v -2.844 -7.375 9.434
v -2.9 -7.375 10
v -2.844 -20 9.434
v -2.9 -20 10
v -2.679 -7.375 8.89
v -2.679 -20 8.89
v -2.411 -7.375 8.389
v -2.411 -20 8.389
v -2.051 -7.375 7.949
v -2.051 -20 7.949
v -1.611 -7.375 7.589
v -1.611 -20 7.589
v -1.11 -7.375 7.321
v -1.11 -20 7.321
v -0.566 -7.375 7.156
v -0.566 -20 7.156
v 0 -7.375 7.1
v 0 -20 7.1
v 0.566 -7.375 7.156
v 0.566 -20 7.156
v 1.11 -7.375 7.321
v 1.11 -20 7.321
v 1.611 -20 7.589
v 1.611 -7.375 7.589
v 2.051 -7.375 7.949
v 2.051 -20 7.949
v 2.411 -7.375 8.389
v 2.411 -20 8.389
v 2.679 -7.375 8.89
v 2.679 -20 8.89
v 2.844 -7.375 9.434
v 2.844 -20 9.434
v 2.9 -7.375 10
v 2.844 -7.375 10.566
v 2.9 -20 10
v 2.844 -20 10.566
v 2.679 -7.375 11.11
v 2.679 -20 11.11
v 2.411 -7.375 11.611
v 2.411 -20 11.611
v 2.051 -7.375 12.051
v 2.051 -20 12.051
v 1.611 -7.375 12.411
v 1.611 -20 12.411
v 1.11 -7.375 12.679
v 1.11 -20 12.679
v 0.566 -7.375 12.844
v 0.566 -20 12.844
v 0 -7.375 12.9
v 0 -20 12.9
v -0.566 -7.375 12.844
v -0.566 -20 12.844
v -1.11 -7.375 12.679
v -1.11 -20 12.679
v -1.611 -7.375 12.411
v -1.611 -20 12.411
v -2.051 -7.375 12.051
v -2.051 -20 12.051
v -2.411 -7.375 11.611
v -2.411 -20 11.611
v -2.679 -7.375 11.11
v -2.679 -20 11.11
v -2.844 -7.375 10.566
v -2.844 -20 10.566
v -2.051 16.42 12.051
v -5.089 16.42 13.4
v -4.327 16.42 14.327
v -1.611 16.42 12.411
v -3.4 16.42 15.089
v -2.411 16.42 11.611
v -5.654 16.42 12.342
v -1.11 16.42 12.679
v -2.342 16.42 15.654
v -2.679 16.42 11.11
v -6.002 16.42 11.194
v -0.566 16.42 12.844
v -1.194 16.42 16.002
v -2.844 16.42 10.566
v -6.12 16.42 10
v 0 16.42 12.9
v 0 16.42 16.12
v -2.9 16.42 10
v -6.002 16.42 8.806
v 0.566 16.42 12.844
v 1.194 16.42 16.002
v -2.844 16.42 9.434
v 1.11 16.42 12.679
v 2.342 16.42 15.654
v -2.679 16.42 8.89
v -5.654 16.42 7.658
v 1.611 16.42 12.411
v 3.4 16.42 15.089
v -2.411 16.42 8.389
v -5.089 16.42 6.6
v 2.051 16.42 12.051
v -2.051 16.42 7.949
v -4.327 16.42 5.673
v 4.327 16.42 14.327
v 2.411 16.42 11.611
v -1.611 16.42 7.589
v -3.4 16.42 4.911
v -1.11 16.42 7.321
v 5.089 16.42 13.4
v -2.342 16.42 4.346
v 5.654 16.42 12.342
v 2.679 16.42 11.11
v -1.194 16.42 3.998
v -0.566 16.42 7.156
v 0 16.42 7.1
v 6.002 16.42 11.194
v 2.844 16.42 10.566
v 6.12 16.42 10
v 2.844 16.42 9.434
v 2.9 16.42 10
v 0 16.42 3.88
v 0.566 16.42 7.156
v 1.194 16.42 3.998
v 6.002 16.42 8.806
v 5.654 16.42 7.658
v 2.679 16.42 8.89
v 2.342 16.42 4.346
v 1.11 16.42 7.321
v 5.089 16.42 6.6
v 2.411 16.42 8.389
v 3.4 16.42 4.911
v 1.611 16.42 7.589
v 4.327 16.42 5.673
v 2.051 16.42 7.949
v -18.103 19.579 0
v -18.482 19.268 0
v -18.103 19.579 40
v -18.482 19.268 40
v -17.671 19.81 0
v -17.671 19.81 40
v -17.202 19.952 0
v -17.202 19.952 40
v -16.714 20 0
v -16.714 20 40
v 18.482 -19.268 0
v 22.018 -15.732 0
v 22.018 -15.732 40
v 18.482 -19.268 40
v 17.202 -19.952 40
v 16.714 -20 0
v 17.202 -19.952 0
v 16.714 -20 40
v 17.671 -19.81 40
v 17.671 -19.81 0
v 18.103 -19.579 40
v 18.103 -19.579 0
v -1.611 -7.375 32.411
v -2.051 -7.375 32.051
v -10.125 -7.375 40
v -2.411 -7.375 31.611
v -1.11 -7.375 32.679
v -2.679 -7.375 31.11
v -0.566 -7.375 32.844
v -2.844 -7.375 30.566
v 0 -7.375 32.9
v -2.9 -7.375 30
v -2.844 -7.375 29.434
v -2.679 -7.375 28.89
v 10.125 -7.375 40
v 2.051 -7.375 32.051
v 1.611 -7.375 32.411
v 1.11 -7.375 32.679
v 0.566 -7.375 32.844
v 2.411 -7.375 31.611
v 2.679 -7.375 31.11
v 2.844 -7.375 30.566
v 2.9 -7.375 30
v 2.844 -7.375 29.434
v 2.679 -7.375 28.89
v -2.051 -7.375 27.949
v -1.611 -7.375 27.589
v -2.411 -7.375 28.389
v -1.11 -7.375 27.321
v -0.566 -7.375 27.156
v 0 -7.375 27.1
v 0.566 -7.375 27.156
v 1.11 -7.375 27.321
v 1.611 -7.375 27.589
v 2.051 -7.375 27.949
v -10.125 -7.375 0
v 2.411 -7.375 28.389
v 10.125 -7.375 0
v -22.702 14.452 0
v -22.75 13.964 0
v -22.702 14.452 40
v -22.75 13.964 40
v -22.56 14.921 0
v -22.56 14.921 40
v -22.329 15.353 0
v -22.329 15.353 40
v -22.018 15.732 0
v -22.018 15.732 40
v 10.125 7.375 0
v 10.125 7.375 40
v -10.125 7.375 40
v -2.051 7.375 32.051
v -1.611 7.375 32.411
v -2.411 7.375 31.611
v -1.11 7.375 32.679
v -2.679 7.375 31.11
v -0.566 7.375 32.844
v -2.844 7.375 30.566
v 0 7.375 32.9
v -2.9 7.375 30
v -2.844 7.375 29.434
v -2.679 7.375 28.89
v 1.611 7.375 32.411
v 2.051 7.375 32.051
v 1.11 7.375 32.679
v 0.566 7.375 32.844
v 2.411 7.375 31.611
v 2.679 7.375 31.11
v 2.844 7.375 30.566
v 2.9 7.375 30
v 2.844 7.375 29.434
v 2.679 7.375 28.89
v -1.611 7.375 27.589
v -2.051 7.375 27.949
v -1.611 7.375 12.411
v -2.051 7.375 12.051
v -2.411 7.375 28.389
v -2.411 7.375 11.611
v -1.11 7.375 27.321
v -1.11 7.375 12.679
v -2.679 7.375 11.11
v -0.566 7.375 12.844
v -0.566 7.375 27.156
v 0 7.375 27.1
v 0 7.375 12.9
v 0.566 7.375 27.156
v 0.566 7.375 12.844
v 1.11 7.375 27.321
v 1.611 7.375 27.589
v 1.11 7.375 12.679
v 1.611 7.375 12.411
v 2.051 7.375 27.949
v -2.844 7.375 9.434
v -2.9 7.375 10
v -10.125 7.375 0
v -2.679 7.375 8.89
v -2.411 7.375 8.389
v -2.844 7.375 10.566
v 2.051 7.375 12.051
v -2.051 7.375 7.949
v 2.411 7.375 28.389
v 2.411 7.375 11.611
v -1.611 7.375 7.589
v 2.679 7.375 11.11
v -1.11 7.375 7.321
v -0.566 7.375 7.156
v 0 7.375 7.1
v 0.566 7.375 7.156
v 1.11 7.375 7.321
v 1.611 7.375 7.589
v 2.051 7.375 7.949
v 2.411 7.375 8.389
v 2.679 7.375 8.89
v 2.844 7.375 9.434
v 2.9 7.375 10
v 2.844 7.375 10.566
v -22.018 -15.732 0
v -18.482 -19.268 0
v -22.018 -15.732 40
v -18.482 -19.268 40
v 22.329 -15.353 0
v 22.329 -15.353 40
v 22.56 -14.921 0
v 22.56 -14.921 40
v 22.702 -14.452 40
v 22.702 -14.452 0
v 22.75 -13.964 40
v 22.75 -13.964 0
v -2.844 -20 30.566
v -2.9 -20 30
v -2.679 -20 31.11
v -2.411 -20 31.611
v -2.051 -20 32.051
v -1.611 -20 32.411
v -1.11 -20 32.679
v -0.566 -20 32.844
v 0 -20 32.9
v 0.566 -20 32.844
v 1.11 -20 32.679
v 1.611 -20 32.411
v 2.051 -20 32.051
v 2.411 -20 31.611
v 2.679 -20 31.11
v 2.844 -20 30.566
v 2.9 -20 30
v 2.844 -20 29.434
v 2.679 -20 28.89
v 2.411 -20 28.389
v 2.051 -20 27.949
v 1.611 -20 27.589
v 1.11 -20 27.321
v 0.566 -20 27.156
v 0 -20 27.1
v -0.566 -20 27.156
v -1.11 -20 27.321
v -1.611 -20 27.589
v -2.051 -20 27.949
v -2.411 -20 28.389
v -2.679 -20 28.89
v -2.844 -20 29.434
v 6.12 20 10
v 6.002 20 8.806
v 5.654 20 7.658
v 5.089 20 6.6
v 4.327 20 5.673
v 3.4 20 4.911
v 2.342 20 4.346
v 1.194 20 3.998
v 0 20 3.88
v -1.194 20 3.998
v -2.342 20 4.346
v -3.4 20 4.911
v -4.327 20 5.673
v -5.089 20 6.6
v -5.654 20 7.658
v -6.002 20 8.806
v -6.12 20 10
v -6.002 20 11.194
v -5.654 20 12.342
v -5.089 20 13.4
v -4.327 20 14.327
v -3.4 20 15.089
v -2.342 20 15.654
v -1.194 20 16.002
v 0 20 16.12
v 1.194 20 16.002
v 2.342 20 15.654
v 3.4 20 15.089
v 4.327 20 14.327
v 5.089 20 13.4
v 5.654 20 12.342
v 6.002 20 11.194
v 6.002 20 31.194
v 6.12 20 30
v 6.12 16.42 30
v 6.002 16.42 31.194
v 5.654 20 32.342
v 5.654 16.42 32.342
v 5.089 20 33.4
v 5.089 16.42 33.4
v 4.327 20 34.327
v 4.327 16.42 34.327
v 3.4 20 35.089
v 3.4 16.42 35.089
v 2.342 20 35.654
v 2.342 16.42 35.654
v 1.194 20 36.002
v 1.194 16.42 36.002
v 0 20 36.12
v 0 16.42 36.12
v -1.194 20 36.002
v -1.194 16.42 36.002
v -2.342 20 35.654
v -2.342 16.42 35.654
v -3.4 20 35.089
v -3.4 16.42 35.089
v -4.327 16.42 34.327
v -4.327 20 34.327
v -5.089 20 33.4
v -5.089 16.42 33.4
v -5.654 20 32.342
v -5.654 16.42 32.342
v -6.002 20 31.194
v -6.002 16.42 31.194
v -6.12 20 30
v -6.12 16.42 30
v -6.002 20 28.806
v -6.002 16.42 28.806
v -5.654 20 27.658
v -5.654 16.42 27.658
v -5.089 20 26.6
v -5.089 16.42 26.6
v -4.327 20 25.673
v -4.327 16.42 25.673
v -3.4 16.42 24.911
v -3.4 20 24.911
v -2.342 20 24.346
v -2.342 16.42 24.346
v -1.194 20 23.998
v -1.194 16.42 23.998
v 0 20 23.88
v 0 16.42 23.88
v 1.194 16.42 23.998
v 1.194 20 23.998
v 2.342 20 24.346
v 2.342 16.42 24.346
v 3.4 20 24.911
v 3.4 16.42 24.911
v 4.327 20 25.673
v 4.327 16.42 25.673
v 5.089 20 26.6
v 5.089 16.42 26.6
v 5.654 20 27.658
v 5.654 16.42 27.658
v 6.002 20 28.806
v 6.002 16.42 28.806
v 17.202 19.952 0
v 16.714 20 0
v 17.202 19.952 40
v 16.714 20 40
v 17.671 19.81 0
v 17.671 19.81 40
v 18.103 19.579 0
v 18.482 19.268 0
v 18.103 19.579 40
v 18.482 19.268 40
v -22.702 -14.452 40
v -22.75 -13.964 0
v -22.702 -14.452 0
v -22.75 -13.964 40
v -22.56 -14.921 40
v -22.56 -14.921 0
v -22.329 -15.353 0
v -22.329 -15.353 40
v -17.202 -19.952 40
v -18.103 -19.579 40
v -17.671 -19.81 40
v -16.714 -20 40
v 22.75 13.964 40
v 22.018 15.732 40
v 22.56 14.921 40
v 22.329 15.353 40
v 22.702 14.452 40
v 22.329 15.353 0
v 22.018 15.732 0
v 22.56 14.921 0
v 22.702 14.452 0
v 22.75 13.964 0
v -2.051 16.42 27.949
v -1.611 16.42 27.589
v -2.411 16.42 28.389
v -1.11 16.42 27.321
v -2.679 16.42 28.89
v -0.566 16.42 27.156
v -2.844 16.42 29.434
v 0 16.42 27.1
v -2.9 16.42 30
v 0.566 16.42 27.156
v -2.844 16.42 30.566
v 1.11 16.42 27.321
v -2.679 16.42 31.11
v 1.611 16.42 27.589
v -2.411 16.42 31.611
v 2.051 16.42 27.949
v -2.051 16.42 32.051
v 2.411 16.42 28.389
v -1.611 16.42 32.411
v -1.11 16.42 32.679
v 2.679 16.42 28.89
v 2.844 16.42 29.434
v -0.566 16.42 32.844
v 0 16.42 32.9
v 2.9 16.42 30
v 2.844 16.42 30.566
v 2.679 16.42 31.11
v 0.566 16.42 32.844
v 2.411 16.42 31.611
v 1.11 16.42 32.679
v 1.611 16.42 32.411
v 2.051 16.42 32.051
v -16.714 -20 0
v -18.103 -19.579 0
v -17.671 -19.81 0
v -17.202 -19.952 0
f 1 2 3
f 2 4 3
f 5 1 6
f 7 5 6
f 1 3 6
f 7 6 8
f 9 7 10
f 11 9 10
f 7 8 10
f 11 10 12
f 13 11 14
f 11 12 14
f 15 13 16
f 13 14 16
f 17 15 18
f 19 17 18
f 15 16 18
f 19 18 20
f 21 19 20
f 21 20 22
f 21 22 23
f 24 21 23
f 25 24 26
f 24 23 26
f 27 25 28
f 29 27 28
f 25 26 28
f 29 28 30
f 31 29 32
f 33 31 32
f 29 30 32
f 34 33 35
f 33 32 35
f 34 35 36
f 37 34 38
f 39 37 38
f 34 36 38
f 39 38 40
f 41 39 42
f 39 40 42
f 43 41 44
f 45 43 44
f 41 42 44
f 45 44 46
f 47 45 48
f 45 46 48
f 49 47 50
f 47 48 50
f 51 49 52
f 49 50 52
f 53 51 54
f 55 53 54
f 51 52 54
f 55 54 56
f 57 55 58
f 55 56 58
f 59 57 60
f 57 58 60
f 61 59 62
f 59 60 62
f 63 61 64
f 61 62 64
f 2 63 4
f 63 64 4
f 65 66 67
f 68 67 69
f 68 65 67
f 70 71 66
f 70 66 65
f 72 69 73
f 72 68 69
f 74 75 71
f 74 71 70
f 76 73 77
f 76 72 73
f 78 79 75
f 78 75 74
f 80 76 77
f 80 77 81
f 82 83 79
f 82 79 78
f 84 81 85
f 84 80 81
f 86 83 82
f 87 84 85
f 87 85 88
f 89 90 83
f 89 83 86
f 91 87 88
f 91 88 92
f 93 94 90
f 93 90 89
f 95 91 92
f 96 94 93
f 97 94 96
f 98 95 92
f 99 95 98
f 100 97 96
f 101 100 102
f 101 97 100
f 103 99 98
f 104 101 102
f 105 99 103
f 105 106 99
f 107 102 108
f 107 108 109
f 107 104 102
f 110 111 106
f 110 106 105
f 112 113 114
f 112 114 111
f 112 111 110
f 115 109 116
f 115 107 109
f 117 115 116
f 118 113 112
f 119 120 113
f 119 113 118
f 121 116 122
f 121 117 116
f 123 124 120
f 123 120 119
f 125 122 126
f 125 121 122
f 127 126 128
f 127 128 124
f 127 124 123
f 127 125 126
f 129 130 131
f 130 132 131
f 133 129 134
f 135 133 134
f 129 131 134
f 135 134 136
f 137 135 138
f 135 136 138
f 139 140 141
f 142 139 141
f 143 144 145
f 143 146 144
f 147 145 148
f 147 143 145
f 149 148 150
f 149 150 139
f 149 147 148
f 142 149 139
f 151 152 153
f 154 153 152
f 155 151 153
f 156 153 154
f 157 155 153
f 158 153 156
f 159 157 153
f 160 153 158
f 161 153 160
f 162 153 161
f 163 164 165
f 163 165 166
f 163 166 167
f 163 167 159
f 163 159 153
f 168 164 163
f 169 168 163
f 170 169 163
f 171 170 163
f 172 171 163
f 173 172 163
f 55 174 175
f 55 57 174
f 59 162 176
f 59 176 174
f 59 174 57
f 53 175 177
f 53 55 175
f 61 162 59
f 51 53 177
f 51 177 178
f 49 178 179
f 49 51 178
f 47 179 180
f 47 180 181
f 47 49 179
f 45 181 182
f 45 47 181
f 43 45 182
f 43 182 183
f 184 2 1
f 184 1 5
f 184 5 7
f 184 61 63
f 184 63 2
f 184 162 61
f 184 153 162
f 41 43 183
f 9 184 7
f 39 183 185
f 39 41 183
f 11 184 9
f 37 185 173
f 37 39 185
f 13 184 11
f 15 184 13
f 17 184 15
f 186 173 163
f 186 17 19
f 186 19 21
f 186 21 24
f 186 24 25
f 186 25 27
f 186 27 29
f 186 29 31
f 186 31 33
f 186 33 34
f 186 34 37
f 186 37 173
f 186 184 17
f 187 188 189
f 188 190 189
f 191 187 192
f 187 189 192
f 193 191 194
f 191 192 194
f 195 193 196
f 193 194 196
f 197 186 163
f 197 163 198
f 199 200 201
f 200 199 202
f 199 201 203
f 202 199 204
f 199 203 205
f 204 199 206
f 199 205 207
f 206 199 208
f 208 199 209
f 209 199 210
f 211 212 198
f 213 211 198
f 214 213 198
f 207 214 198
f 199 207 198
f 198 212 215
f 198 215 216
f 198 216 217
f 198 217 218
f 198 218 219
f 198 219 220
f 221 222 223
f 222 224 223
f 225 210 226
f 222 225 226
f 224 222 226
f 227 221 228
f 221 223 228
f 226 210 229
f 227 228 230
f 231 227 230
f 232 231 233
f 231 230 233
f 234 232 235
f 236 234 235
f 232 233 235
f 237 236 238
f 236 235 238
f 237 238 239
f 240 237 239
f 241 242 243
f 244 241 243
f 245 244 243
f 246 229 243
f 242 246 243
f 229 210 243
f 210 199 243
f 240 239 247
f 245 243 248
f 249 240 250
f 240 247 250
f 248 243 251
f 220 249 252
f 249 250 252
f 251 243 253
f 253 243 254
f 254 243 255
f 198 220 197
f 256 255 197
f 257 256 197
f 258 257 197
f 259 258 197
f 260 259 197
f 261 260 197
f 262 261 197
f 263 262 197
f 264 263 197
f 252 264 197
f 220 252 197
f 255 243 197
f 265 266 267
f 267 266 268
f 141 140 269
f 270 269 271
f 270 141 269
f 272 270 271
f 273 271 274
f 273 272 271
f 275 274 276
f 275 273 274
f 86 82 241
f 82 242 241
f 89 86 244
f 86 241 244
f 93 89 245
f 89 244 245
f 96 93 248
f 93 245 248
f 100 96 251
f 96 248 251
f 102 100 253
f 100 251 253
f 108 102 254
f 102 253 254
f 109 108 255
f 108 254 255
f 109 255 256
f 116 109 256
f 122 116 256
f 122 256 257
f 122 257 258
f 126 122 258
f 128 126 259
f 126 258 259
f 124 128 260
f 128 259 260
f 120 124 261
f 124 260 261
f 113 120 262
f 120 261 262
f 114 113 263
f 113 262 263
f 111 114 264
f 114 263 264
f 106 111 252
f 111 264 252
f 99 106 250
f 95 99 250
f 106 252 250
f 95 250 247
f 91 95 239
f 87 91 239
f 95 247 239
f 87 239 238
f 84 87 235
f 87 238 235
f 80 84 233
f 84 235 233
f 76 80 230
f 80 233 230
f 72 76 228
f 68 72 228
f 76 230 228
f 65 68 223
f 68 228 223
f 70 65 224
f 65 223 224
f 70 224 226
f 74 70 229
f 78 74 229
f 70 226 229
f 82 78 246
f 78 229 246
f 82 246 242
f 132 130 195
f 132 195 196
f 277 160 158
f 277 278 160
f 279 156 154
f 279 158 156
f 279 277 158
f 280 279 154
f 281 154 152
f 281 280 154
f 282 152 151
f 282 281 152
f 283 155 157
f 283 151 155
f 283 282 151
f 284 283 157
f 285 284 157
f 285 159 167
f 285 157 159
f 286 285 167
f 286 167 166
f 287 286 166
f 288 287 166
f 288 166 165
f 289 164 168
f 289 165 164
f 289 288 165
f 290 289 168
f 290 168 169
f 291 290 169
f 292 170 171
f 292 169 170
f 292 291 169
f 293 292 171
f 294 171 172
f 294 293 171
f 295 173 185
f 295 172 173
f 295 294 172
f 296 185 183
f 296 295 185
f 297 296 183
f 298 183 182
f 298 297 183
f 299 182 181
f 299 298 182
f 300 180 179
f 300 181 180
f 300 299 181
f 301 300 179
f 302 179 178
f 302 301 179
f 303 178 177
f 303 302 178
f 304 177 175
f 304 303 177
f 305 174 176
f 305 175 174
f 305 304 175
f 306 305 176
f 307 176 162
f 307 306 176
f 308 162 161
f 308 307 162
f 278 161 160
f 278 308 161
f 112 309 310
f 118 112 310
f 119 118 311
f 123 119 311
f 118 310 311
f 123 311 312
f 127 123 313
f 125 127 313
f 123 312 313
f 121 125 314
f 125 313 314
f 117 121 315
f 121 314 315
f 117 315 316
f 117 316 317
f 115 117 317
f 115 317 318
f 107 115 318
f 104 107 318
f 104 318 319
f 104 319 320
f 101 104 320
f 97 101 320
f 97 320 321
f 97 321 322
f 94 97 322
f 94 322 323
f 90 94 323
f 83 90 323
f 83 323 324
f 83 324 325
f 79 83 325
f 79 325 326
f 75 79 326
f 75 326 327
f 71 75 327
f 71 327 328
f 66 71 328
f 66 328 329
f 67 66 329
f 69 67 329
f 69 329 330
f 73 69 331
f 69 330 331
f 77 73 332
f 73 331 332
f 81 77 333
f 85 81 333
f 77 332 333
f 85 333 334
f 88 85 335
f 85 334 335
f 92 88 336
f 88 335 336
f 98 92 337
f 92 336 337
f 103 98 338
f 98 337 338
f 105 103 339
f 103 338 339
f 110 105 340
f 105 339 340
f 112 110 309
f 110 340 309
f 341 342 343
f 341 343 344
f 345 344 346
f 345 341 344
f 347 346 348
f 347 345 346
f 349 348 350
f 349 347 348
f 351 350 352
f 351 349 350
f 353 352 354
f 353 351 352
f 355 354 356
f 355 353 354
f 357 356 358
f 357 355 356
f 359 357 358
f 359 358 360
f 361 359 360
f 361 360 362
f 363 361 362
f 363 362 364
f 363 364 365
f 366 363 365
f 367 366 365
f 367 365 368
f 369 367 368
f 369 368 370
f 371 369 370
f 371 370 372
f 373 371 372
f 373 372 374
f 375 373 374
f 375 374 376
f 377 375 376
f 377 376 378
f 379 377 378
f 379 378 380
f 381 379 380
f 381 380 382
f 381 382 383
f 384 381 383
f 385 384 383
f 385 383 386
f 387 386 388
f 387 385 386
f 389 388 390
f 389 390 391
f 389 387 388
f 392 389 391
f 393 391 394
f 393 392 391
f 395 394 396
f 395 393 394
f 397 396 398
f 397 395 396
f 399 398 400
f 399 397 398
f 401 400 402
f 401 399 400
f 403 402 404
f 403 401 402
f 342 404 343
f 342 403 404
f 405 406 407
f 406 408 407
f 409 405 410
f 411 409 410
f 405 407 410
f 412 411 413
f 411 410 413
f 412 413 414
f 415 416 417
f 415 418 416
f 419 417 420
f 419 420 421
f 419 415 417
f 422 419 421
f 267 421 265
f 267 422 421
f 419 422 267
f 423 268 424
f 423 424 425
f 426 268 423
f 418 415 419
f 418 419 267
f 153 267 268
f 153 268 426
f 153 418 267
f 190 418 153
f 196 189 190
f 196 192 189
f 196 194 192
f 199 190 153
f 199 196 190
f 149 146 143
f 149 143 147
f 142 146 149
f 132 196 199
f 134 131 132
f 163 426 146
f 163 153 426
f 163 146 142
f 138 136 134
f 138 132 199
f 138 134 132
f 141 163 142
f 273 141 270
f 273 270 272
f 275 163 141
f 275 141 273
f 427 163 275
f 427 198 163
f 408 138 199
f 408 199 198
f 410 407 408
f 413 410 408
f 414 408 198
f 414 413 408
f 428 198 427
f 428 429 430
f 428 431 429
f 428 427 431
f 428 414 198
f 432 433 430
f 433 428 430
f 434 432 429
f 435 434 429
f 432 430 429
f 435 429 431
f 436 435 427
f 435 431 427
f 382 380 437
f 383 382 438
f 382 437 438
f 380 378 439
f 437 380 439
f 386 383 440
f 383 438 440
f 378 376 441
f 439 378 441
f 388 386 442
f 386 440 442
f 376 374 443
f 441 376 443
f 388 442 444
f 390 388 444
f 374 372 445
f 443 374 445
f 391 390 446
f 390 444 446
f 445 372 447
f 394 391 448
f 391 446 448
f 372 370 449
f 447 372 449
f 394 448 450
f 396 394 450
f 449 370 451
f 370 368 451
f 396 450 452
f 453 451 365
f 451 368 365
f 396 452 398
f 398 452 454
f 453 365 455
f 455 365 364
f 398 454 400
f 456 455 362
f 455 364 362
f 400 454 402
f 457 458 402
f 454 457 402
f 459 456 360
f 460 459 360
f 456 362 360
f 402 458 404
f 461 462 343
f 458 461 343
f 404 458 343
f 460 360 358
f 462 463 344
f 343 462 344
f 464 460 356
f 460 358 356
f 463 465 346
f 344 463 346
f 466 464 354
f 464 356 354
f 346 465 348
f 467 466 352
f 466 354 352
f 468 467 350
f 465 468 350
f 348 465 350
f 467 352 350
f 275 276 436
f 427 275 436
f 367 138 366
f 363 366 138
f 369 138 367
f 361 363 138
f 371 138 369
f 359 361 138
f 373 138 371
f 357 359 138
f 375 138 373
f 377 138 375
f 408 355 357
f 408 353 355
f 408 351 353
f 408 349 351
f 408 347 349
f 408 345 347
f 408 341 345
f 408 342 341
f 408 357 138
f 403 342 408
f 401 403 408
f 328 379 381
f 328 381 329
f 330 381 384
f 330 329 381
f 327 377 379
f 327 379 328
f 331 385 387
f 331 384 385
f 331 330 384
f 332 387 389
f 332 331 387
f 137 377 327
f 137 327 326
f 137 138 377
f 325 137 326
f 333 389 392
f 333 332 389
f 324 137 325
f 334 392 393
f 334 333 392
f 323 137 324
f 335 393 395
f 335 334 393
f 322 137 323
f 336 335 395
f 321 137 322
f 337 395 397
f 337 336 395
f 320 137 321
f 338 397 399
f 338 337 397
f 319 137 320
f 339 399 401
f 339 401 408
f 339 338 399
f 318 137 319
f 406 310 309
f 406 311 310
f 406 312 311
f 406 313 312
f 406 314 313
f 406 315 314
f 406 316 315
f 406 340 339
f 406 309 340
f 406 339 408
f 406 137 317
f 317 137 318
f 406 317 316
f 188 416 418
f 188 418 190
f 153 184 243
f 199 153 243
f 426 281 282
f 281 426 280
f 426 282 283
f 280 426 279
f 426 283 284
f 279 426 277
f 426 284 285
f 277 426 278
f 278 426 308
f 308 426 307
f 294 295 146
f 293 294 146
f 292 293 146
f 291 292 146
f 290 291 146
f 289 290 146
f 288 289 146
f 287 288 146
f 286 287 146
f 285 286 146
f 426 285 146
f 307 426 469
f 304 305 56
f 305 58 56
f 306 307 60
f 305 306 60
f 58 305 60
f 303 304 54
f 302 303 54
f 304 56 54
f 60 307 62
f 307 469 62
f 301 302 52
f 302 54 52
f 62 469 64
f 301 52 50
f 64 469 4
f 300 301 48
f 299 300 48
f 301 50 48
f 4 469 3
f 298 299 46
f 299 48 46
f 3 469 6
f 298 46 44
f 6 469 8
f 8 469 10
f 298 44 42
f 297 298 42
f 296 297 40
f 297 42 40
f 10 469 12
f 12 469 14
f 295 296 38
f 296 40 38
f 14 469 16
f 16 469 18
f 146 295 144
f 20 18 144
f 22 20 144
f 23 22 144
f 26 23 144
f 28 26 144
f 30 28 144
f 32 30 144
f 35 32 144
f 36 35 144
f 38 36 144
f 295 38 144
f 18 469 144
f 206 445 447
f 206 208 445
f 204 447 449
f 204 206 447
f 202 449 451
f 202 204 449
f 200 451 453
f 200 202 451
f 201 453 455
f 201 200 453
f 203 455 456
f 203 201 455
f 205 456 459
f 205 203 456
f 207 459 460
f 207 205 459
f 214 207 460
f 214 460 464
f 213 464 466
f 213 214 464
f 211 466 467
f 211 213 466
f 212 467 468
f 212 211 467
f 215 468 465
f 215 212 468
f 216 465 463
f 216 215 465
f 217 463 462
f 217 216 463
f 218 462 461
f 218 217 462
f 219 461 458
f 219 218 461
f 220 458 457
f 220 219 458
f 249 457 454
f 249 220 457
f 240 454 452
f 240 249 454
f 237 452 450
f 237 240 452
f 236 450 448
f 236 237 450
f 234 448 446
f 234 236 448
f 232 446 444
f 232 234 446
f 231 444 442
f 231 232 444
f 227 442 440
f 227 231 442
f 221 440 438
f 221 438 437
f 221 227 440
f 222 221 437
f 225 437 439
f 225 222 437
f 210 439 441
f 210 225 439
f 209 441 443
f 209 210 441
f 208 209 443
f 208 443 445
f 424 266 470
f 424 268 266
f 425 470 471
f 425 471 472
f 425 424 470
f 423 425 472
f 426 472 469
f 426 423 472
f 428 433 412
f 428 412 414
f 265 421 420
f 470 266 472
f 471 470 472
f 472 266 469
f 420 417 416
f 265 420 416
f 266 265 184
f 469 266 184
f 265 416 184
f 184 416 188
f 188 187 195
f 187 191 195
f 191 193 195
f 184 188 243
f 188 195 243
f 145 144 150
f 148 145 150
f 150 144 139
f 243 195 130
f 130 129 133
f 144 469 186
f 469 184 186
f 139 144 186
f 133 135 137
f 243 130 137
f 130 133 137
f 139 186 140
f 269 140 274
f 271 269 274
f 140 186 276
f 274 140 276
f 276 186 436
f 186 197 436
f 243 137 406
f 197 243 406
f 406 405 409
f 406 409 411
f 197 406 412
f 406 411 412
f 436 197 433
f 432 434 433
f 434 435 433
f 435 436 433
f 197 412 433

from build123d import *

# Parameters (mm, degrees)
SKETCH1_W                               = 45.5
SKETCH1_H                               = 40
SKETCH1_W_2                             = 20.25
SKETCH1_H_2                             = 14.75
BOSS_EXTRUDE1_DEPTH                     = 40
CHAMFER1_SIZE                           = 5
FILLET1_R                               = 2.5
CBORE_FOR_M5_HEX_HEAD_BOLT1_D           = 5.8
CBORE_FOR_M5_HEX_HEAD_BOLT1_CBORE_D     = 12.24
CBORE_FOR_M5_HEX_HEAD_BOLT1_CBORE_DEPTH = 3.58


with BuildPart() as part:
    # Sketch1 → Boss-Extrude1 (new body)
    with BuildSketch(Plane.XY):
        Rectangle(SKETCH1_W, SKETCH1_H)
        Rectangle(SKETCH1_W_2, SKETCH1_H_2, mode=Mode.SUBTRACT)
    extrude(amount=BOSS_EXTRUDE1_DEPTH)

    # Chamfer1
    chamfer1_edges = [part.edges().sort_by_distance(p)[0] for p in [
        (22.75, -20, 20),
        (-22.75, -20, 20),
        (-22.75, 20, 20),
        (22.75, 20, 20),
    ]]
    chamfer(chamfer1_edges, length=CHAMFER1_SIZE)

    # Fillet1
    fillet1_edges = [part.edges().sort_by_distance(p)[0] for p in [
        (-17.75, 20, 20),
        (17.75, 20, 20),
        (22.75, -15, 20),
        (22.75, 15, 20),
        (-17.75, -20, 20),
        (17.75, -20, 20),
        (-22.75, 15, 20),
        (-22.75, -15, 20),
    ]]
    fillet(fillet1_edges, radius=FILLET1_R)

    # CBORE for M5 Hex Head Bolt1 (through all)
    with Locations(Plane(origin=(0, 20, 0), x_dir=(1, 0, 0), z_dir=(0, 1, 0))):
        with Locations((0, -10)):
            cbore_for_m5_hex_head_bolt1 = CounterBoreHole(CBORE_FOR_M5_HEX_HEAD_BOLT1_D / 2, CBORE_FOR_M5_HEX_HEAD_BOLT1_CBORE_D / 2, CBORE_FOR_M5_HEX_HEAD_BOLT1_CBORE_DEPTH)

    # Mirror1: CBORE for M5 Hex Head Bolt1 across plane
    add(cbore_for_m5_hex_head_bolt1.mirror(Plane(origin=(0, 0, 20), x_dir=(1, 0, 0), z_dir=(0, 0, -1))), mode=Mode.SUBTRACT)


solid = part.part
